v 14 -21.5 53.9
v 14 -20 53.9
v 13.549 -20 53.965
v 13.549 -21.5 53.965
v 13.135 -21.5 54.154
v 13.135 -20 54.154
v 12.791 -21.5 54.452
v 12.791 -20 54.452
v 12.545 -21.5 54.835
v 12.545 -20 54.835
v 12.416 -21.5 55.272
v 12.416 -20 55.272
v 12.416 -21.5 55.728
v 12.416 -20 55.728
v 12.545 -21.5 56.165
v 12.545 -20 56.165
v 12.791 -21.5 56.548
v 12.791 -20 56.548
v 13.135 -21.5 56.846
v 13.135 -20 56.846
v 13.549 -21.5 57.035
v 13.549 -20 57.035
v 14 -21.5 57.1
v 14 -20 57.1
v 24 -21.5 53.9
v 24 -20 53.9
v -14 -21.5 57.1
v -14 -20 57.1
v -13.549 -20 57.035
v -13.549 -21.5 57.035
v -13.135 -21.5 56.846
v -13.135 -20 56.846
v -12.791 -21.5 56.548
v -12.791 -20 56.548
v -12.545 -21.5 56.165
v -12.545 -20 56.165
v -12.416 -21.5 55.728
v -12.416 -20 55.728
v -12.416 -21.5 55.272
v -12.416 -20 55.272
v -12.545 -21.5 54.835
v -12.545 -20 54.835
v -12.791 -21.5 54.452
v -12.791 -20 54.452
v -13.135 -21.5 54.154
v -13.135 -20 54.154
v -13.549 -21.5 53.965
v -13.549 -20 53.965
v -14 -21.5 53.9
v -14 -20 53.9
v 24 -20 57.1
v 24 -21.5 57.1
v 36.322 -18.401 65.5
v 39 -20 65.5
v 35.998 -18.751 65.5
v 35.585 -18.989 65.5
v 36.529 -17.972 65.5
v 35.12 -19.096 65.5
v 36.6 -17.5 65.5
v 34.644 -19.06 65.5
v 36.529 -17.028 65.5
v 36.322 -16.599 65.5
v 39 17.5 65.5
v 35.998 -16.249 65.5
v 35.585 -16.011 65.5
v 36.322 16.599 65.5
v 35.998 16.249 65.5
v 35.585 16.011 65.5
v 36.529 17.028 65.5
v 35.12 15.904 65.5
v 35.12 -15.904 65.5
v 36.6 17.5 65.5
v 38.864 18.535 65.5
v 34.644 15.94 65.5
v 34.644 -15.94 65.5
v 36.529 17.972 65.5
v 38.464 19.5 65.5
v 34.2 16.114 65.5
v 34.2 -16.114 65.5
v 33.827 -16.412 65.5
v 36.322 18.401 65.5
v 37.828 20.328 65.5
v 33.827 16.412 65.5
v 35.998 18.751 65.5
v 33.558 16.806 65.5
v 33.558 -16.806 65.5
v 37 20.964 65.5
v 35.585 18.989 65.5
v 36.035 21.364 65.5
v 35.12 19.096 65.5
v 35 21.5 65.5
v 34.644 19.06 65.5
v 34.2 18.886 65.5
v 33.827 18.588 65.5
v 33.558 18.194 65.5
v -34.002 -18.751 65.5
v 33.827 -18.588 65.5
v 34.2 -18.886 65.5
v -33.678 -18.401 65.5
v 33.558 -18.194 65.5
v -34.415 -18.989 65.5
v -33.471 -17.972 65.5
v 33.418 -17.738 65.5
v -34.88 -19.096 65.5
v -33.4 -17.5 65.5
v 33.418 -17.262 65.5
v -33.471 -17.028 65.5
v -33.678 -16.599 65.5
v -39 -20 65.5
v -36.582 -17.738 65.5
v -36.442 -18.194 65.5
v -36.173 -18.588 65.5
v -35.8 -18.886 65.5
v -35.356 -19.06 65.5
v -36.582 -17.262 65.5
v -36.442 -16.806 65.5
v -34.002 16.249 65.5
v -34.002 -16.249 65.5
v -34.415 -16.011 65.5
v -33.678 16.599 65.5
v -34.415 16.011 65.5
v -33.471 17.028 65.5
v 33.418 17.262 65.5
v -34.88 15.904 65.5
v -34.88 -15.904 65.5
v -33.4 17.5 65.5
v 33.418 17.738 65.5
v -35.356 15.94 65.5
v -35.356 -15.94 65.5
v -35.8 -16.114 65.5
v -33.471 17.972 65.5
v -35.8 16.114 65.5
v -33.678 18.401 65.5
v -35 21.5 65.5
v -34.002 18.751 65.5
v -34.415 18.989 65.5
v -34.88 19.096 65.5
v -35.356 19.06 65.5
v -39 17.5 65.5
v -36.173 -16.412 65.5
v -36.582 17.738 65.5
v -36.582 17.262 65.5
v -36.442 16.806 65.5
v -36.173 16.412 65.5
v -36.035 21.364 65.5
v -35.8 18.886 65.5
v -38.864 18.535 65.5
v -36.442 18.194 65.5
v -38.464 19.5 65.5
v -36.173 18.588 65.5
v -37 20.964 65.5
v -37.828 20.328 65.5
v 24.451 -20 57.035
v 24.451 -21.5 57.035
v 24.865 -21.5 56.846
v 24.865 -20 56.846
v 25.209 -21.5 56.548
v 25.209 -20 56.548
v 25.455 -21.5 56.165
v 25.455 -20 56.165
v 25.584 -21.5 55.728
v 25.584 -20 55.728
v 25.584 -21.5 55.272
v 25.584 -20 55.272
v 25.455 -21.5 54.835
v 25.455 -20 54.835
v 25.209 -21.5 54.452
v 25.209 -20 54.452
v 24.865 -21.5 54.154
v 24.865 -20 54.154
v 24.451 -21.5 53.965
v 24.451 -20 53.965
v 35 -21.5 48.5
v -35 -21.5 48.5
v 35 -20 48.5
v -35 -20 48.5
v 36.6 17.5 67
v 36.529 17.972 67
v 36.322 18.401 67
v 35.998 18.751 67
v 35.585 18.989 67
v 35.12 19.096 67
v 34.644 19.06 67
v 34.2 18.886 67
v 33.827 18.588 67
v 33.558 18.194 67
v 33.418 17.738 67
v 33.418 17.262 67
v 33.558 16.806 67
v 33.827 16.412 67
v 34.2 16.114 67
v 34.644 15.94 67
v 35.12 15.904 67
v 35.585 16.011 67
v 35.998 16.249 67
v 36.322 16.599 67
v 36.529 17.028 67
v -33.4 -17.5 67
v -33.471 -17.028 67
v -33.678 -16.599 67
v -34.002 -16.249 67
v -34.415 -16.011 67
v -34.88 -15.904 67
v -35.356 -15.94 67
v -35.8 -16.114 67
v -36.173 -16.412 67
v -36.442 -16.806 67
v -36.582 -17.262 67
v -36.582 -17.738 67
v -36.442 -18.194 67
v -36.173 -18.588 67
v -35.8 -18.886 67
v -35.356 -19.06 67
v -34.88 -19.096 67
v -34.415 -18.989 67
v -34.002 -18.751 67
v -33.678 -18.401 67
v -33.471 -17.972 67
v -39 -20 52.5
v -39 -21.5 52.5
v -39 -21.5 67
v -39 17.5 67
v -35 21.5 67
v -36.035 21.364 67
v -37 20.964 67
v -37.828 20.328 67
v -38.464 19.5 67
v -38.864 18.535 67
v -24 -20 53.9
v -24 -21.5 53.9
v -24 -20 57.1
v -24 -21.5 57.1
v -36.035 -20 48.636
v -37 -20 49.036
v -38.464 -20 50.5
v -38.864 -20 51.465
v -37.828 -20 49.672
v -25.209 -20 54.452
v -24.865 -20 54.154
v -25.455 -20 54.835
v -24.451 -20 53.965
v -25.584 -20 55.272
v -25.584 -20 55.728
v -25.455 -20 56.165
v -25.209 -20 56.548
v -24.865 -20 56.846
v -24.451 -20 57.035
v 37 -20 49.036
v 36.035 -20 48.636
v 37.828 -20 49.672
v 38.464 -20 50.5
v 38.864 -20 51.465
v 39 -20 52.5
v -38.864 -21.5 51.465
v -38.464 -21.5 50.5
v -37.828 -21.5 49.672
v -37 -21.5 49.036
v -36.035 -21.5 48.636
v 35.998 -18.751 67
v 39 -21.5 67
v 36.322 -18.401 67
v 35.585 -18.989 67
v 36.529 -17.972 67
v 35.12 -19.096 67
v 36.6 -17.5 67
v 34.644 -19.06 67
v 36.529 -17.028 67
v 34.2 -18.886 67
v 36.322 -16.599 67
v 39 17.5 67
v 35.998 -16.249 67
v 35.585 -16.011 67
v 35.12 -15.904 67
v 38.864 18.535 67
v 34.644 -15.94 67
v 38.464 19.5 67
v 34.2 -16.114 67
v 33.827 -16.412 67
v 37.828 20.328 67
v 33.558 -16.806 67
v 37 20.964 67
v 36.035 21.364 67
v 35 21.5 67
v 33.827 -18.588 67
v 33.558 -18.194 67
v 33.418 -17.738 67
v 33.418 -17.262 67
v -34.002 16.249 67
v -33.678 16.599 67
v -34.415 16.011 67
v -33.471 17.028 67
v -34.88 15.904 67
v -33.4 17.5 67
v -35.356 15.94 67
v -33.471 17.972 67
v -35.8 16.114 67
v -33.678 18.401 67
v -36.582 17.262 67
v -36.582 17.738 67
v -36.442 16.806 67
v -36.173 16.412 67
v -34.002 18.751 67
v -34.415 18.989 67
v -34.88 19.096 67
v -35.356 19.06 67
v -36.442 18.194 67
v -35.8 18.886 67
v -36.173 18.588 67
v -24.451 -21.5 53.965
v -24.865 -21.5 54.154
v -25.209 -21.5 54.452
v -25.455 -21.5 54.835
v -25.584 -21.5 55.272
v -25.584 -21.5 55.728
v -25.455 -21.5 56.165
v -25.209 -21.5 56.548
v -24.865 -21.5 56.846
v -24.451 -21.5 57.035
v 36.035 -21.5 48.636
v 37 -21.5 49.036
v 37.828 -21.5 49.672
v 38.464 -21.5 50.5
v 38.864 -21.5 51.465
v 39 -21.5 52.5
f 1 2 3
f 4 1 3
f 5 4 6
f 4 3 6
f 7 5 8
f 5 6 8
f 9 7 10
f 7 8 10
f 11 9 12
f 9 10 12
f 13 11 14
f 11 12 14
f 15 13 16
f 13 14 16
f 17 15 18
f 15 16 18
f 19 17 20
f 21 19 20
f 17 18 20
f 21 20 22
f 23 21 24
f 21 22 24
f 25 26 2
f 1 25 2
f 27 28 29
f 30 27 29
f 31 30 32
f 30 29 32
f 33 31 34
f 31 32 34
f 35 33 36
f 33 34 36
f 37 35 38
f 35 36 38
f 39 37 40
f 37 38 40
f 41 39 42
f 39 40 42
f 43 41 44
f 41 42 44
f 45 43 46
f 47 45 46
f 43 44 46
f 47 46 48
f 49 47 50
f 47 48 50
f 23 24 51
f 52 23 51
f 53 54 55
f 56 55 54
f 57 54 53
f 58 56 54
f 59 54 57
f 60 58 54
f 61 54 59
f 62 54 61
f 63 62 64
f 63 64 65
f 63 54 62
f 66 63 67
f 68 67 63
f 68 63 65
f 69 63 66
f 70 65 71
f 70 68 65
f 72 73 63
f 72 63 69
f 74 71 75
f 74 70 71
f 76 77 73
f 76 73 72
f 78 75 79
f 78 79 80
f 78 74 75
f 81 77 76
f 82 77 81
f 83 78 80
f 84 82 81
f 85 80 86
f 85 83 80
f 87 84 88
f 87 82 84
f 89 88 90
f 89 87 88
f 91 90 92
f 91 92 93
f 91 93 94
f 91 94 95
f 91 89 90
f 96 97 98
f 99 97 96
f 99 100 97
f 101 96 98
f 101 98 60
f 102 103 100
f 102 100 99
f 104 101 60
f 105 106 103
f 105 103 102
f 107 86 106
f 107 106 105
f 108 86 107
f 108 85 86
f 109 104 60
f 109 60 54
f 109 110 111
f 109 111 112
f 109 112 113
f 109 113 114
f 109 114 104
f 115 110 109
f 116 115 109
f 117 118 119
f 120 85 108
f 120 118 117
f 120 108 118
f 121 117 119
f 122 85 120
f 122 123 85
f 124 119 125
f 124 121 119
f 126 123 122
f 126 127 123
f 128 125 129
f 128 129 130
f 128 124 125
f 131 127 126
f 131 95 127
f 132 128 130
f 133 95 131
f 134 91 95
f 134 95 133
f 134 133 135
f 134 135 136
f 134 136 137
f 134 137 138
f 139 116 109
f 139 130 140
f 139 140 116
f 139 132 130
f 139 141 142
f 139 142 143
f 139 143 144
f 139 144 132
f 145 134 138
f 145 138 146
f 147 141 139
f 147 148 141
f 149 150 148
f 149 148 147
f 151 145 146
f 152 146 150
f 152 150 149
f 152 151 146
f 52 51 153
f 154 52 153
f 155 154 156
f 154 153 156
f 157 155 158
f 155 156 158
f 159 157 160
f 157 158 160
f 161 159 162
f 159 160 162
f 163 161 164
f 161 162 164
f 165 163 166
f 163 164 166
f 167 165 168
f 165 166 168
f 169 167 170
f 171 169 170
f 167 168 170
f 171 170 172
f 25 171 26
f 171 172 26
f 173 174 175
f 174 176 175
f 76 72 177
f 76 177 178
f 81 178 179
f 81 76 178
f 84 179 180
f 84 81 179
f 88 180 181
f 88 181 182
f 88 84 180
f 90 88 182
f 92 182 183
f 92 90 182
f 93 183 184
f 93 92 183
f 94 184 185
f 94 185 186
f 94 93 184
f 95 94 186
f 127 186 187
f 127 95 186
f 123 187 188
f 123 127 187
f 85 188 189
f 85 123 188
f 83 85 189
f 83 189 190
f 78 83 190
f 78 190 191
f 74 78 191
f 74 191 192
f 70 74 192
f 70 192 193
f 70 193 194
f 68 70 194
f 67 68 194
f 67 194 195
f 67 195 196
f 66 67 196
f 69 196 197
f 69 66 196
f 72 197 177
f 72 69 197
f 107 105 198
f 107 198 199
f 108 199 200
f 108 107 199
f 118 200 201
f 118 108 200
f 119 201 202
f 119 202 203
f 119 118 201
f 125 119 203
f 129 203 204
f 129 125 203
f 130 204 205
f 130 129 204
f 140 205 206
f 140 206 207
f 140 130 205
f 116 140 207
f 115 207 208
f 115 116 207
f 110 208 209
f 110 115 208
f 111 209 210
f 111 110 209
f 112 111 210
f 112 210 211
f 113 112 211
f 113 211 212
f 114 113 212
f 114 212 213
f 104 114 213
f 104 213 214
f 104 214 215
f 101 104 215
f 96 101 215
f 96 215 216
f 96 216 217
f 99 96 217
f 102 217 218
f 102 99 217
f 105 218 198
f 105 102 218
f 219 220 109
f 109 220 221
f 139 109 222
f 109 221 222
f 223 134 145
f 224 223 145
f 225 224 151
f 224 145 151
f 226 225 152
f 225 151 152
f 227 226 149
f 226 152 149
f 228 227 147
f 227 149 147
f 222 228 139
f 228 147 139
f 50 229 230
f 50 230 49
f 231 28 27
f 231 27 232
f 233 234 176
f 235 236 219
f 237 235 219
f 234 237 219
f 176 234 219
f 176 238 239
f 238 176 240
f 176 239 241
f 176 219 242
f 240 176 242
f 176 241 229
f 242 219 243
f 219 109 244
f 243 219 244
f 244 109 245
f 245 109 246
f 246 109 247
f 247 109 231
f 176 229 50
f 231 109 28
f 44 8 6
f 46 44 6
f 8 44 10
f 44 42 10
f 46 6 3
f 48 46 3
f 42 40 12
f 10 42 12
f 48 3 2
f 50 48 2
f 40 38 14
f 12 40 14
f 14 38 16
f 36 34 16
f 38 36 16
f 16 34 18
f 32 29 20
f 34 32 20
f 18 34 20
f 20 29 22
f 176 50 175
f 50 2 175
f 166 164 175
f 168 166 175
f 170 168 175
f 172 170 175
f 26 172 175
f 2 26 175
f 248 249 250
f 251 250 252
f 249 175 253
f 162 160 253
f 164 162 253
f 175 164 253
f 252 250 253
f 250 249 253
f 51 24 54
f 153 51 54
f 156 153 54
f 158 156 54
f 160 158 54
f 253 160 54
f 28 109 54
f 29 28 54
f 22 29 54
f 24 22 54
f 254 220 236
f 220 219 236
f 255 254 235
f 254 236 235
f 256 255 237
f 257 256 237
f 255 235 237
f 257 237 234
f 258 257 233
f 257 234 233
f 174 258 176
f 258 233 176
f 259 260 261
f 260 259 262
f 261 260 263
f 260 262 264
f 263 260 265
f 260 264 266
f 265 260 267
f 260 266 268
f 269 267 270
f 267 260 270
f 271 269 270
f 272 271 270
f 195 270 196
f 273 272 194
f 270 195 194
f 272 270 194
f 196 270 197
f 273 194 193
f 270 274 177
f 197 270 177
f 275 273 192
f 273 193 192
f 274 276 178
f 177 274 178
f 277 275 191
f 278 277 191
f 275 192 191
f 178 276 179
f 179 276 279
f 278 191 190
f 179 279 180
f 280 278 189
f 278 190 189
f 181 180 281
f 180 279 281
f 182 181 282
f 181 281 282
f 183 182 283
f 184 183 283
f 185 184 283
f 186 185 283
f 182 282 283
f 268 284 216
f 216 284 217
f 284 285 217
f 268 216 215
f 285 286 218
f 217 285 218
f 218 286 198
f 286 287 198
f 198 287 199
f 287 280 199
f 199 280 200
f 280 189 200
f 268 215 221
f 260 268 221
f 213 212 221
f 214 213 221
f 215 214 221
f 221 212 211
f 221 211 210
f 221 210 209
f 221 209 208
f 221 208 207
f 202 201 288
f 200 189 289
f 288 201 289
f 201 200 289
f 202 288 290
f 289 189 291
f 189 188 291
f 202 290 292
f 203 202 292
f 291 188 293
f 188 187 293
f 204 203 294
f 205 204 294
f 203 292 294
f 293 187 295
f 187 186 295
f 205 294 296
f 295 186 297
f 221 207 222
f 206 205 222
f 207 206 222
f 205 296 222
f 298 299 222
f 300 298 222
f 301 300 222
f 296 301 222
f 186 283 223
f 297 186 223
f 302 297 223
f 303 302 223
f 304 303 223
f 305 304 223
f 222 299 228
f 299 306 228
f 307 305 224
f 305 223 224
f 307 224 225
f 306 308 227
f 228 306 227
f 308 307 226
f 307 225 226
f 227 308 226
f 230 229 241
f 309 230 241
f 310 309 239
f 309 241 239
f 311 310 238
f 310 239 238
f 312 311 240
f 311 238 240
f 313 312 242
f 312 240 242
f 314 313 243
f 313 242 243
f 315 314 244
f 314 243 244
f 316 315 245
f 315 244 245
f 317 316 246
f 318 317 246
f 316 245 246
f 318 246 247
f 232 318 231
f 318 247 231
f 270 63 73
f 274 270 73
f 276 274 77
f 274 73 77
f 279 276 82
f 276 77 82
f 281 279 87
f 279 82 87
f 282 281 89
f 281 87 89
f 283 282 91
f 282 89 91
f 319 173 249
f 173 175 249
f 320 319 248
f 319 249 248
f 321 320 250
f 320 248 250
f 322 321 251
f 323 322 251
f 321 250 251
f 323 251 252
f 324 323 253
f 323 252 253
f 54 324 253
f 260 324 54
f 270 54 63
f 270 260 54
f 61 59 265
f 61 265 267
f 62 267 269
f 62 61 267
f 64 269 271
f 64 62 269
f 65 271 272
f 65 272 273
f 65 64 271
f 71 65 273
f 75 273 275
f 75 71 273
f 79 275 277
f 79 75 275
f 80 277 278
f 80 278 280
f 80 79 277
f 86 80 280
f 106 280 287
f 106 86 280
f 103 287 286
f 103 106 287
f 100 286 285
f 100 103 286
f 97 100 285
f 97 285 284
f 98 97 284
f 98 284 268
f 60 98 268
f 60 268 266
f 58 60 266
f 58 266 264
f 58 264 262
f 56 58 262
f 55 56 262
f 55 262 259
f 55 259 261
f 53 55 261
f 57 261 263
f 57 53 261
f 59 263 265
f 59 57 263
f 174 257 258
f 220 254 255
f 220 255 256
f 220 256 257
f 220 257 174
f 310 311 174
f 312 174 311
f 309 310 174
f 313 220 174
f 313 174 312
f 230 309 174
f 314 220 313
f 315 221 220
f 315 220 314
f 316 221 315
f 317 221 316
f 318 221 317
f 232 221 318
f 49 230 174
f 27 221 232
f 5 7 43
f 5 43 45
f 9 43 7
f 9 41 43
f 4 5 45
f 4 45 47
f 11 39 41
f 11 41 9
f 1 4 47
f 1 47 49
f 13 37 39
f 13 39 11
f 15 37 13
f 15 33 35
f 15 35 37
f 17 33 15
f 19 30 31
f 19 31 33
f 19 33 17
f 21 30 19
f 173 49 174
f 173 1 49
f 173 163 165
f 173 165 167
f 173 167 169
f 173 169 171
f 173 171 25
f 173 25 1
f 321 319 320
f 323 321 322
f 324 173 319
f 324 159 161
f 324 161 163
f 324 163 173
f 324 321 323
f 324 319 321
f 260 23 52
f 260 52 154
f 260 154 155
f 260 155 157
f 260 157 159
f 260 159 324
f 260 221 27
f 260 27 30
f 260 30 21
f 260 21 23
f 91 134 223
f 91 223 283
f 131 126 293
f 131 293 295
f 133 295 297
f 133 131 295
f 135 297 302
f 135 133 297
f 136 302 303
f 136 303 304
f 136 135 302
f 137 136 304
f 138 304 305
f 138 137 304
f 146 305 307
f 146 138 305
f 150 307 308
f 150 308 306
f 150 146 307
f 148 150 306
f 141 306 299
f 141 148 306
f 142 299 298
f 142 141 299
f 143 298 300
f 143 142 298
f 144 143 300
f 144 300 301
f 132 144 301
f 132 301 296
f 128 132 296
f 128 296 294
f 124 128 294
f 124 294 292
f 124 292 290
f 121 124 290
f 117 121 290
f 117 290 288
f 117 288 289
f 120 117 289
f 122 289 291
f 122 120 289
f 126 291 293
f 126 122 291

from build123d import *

# Parameters (mm, degrees)
SKETCH006_R  = 1.6
PAD007_DEPTH = 1.5
SKETCH_W     = 78
SKETCH_H     = 1.5
PAD008_DEPTH = 17
POCKET_DEPTH = 1.501
FILLET_R     = 4


with BuildPart() as part:
    # Sketch006 → Pad007 (new body)
    with BuildSketch(Plane.XY):
        with BuildLine():
            Line((-35, 21.5), (35, 21.5))
            ThreePointArc((39, 17.5), (37.828427, 20.328427), (35, 21.5))
            Line((39, -21.5), (39, 17.5))
            Line((-39, -21.5), (39, -21.5))
            Line((-39, 17.5), (-39, -21.5))
            ThreePointArc((-35, 21.5), (-37.828427, 20.328427), (-39, 17.5))
        make_face()
        with Locations((-35, -17.5)):
            Circle(SKETCH006_R, mode=Mode.SUBTRACT)
        with Locations((35, 17.5)):
            Circle(SKETCH006_R, mode=Mode.SUBTRACT)
        with Locations((35, -17.5)):
            Circle(SKETCH006_R, mode=Mode.SUBTRACT)
        with Locations((-35, 17.5)):
            Circle(SKETCH006_R, mode=Mode.SUBTRACT)
    extrude(amount=PAD007_DEPTH)

    # Sketch → Pad008 (join)
    with BuildSketch(Plane.XY):
        with Locations((0, -20.75)):
            Rectangle(SKETCH_W, SKETCH_H)
    extrude(amount=-PAD008_DEPTH)

    # Sketch012 (on Face11 of Pad008) → Pocket (cut, through all)
    with BuildSketch(Plane(origin=(0, -20, 0), x_dir=(-1, 0, 0), z_dir=(0, 1, 0))):
        with BuildLine():
            ThreePointArc((-24, -8.4), (-25.6, -10), (-24, -11.6))
            Line((-24, -11.6), (-14, -11.6))
            ThreePointArc((-14, -11.6), (-12.4, -10), (-14, -8.4))
            Line((-14, -8.4), (-24, -8.4))
        make_face()
        with BuildLine():
            ThreePointArc((24, -11.6), (25.6, -10), (24, -8.4))
            Line((14, -8.4), (24, -8.4))
            ThreePointArc((14, -8.4), (12.4, -10), (14, -11.6))
            Line((24, -11.6), (14, -11.6))
        make_face()
    extrude(amount=-POCKET_DEPTH, mode=Mode.SUBTRACT)

    # Fillet
    fillet_edges = [part.edges().sort_by_distance(p)[0] for p in [
        (-39, -20.75, -17),
        (39, -20.75, -17),
    ]]
    fillet(fillet_edges, radius=FILLET_R)


with BuildPart() as part_1:
    # Body001 placement: moved
    add(part.part.moved(Location((0, 0, 65.5))))


solid = part_1.part
